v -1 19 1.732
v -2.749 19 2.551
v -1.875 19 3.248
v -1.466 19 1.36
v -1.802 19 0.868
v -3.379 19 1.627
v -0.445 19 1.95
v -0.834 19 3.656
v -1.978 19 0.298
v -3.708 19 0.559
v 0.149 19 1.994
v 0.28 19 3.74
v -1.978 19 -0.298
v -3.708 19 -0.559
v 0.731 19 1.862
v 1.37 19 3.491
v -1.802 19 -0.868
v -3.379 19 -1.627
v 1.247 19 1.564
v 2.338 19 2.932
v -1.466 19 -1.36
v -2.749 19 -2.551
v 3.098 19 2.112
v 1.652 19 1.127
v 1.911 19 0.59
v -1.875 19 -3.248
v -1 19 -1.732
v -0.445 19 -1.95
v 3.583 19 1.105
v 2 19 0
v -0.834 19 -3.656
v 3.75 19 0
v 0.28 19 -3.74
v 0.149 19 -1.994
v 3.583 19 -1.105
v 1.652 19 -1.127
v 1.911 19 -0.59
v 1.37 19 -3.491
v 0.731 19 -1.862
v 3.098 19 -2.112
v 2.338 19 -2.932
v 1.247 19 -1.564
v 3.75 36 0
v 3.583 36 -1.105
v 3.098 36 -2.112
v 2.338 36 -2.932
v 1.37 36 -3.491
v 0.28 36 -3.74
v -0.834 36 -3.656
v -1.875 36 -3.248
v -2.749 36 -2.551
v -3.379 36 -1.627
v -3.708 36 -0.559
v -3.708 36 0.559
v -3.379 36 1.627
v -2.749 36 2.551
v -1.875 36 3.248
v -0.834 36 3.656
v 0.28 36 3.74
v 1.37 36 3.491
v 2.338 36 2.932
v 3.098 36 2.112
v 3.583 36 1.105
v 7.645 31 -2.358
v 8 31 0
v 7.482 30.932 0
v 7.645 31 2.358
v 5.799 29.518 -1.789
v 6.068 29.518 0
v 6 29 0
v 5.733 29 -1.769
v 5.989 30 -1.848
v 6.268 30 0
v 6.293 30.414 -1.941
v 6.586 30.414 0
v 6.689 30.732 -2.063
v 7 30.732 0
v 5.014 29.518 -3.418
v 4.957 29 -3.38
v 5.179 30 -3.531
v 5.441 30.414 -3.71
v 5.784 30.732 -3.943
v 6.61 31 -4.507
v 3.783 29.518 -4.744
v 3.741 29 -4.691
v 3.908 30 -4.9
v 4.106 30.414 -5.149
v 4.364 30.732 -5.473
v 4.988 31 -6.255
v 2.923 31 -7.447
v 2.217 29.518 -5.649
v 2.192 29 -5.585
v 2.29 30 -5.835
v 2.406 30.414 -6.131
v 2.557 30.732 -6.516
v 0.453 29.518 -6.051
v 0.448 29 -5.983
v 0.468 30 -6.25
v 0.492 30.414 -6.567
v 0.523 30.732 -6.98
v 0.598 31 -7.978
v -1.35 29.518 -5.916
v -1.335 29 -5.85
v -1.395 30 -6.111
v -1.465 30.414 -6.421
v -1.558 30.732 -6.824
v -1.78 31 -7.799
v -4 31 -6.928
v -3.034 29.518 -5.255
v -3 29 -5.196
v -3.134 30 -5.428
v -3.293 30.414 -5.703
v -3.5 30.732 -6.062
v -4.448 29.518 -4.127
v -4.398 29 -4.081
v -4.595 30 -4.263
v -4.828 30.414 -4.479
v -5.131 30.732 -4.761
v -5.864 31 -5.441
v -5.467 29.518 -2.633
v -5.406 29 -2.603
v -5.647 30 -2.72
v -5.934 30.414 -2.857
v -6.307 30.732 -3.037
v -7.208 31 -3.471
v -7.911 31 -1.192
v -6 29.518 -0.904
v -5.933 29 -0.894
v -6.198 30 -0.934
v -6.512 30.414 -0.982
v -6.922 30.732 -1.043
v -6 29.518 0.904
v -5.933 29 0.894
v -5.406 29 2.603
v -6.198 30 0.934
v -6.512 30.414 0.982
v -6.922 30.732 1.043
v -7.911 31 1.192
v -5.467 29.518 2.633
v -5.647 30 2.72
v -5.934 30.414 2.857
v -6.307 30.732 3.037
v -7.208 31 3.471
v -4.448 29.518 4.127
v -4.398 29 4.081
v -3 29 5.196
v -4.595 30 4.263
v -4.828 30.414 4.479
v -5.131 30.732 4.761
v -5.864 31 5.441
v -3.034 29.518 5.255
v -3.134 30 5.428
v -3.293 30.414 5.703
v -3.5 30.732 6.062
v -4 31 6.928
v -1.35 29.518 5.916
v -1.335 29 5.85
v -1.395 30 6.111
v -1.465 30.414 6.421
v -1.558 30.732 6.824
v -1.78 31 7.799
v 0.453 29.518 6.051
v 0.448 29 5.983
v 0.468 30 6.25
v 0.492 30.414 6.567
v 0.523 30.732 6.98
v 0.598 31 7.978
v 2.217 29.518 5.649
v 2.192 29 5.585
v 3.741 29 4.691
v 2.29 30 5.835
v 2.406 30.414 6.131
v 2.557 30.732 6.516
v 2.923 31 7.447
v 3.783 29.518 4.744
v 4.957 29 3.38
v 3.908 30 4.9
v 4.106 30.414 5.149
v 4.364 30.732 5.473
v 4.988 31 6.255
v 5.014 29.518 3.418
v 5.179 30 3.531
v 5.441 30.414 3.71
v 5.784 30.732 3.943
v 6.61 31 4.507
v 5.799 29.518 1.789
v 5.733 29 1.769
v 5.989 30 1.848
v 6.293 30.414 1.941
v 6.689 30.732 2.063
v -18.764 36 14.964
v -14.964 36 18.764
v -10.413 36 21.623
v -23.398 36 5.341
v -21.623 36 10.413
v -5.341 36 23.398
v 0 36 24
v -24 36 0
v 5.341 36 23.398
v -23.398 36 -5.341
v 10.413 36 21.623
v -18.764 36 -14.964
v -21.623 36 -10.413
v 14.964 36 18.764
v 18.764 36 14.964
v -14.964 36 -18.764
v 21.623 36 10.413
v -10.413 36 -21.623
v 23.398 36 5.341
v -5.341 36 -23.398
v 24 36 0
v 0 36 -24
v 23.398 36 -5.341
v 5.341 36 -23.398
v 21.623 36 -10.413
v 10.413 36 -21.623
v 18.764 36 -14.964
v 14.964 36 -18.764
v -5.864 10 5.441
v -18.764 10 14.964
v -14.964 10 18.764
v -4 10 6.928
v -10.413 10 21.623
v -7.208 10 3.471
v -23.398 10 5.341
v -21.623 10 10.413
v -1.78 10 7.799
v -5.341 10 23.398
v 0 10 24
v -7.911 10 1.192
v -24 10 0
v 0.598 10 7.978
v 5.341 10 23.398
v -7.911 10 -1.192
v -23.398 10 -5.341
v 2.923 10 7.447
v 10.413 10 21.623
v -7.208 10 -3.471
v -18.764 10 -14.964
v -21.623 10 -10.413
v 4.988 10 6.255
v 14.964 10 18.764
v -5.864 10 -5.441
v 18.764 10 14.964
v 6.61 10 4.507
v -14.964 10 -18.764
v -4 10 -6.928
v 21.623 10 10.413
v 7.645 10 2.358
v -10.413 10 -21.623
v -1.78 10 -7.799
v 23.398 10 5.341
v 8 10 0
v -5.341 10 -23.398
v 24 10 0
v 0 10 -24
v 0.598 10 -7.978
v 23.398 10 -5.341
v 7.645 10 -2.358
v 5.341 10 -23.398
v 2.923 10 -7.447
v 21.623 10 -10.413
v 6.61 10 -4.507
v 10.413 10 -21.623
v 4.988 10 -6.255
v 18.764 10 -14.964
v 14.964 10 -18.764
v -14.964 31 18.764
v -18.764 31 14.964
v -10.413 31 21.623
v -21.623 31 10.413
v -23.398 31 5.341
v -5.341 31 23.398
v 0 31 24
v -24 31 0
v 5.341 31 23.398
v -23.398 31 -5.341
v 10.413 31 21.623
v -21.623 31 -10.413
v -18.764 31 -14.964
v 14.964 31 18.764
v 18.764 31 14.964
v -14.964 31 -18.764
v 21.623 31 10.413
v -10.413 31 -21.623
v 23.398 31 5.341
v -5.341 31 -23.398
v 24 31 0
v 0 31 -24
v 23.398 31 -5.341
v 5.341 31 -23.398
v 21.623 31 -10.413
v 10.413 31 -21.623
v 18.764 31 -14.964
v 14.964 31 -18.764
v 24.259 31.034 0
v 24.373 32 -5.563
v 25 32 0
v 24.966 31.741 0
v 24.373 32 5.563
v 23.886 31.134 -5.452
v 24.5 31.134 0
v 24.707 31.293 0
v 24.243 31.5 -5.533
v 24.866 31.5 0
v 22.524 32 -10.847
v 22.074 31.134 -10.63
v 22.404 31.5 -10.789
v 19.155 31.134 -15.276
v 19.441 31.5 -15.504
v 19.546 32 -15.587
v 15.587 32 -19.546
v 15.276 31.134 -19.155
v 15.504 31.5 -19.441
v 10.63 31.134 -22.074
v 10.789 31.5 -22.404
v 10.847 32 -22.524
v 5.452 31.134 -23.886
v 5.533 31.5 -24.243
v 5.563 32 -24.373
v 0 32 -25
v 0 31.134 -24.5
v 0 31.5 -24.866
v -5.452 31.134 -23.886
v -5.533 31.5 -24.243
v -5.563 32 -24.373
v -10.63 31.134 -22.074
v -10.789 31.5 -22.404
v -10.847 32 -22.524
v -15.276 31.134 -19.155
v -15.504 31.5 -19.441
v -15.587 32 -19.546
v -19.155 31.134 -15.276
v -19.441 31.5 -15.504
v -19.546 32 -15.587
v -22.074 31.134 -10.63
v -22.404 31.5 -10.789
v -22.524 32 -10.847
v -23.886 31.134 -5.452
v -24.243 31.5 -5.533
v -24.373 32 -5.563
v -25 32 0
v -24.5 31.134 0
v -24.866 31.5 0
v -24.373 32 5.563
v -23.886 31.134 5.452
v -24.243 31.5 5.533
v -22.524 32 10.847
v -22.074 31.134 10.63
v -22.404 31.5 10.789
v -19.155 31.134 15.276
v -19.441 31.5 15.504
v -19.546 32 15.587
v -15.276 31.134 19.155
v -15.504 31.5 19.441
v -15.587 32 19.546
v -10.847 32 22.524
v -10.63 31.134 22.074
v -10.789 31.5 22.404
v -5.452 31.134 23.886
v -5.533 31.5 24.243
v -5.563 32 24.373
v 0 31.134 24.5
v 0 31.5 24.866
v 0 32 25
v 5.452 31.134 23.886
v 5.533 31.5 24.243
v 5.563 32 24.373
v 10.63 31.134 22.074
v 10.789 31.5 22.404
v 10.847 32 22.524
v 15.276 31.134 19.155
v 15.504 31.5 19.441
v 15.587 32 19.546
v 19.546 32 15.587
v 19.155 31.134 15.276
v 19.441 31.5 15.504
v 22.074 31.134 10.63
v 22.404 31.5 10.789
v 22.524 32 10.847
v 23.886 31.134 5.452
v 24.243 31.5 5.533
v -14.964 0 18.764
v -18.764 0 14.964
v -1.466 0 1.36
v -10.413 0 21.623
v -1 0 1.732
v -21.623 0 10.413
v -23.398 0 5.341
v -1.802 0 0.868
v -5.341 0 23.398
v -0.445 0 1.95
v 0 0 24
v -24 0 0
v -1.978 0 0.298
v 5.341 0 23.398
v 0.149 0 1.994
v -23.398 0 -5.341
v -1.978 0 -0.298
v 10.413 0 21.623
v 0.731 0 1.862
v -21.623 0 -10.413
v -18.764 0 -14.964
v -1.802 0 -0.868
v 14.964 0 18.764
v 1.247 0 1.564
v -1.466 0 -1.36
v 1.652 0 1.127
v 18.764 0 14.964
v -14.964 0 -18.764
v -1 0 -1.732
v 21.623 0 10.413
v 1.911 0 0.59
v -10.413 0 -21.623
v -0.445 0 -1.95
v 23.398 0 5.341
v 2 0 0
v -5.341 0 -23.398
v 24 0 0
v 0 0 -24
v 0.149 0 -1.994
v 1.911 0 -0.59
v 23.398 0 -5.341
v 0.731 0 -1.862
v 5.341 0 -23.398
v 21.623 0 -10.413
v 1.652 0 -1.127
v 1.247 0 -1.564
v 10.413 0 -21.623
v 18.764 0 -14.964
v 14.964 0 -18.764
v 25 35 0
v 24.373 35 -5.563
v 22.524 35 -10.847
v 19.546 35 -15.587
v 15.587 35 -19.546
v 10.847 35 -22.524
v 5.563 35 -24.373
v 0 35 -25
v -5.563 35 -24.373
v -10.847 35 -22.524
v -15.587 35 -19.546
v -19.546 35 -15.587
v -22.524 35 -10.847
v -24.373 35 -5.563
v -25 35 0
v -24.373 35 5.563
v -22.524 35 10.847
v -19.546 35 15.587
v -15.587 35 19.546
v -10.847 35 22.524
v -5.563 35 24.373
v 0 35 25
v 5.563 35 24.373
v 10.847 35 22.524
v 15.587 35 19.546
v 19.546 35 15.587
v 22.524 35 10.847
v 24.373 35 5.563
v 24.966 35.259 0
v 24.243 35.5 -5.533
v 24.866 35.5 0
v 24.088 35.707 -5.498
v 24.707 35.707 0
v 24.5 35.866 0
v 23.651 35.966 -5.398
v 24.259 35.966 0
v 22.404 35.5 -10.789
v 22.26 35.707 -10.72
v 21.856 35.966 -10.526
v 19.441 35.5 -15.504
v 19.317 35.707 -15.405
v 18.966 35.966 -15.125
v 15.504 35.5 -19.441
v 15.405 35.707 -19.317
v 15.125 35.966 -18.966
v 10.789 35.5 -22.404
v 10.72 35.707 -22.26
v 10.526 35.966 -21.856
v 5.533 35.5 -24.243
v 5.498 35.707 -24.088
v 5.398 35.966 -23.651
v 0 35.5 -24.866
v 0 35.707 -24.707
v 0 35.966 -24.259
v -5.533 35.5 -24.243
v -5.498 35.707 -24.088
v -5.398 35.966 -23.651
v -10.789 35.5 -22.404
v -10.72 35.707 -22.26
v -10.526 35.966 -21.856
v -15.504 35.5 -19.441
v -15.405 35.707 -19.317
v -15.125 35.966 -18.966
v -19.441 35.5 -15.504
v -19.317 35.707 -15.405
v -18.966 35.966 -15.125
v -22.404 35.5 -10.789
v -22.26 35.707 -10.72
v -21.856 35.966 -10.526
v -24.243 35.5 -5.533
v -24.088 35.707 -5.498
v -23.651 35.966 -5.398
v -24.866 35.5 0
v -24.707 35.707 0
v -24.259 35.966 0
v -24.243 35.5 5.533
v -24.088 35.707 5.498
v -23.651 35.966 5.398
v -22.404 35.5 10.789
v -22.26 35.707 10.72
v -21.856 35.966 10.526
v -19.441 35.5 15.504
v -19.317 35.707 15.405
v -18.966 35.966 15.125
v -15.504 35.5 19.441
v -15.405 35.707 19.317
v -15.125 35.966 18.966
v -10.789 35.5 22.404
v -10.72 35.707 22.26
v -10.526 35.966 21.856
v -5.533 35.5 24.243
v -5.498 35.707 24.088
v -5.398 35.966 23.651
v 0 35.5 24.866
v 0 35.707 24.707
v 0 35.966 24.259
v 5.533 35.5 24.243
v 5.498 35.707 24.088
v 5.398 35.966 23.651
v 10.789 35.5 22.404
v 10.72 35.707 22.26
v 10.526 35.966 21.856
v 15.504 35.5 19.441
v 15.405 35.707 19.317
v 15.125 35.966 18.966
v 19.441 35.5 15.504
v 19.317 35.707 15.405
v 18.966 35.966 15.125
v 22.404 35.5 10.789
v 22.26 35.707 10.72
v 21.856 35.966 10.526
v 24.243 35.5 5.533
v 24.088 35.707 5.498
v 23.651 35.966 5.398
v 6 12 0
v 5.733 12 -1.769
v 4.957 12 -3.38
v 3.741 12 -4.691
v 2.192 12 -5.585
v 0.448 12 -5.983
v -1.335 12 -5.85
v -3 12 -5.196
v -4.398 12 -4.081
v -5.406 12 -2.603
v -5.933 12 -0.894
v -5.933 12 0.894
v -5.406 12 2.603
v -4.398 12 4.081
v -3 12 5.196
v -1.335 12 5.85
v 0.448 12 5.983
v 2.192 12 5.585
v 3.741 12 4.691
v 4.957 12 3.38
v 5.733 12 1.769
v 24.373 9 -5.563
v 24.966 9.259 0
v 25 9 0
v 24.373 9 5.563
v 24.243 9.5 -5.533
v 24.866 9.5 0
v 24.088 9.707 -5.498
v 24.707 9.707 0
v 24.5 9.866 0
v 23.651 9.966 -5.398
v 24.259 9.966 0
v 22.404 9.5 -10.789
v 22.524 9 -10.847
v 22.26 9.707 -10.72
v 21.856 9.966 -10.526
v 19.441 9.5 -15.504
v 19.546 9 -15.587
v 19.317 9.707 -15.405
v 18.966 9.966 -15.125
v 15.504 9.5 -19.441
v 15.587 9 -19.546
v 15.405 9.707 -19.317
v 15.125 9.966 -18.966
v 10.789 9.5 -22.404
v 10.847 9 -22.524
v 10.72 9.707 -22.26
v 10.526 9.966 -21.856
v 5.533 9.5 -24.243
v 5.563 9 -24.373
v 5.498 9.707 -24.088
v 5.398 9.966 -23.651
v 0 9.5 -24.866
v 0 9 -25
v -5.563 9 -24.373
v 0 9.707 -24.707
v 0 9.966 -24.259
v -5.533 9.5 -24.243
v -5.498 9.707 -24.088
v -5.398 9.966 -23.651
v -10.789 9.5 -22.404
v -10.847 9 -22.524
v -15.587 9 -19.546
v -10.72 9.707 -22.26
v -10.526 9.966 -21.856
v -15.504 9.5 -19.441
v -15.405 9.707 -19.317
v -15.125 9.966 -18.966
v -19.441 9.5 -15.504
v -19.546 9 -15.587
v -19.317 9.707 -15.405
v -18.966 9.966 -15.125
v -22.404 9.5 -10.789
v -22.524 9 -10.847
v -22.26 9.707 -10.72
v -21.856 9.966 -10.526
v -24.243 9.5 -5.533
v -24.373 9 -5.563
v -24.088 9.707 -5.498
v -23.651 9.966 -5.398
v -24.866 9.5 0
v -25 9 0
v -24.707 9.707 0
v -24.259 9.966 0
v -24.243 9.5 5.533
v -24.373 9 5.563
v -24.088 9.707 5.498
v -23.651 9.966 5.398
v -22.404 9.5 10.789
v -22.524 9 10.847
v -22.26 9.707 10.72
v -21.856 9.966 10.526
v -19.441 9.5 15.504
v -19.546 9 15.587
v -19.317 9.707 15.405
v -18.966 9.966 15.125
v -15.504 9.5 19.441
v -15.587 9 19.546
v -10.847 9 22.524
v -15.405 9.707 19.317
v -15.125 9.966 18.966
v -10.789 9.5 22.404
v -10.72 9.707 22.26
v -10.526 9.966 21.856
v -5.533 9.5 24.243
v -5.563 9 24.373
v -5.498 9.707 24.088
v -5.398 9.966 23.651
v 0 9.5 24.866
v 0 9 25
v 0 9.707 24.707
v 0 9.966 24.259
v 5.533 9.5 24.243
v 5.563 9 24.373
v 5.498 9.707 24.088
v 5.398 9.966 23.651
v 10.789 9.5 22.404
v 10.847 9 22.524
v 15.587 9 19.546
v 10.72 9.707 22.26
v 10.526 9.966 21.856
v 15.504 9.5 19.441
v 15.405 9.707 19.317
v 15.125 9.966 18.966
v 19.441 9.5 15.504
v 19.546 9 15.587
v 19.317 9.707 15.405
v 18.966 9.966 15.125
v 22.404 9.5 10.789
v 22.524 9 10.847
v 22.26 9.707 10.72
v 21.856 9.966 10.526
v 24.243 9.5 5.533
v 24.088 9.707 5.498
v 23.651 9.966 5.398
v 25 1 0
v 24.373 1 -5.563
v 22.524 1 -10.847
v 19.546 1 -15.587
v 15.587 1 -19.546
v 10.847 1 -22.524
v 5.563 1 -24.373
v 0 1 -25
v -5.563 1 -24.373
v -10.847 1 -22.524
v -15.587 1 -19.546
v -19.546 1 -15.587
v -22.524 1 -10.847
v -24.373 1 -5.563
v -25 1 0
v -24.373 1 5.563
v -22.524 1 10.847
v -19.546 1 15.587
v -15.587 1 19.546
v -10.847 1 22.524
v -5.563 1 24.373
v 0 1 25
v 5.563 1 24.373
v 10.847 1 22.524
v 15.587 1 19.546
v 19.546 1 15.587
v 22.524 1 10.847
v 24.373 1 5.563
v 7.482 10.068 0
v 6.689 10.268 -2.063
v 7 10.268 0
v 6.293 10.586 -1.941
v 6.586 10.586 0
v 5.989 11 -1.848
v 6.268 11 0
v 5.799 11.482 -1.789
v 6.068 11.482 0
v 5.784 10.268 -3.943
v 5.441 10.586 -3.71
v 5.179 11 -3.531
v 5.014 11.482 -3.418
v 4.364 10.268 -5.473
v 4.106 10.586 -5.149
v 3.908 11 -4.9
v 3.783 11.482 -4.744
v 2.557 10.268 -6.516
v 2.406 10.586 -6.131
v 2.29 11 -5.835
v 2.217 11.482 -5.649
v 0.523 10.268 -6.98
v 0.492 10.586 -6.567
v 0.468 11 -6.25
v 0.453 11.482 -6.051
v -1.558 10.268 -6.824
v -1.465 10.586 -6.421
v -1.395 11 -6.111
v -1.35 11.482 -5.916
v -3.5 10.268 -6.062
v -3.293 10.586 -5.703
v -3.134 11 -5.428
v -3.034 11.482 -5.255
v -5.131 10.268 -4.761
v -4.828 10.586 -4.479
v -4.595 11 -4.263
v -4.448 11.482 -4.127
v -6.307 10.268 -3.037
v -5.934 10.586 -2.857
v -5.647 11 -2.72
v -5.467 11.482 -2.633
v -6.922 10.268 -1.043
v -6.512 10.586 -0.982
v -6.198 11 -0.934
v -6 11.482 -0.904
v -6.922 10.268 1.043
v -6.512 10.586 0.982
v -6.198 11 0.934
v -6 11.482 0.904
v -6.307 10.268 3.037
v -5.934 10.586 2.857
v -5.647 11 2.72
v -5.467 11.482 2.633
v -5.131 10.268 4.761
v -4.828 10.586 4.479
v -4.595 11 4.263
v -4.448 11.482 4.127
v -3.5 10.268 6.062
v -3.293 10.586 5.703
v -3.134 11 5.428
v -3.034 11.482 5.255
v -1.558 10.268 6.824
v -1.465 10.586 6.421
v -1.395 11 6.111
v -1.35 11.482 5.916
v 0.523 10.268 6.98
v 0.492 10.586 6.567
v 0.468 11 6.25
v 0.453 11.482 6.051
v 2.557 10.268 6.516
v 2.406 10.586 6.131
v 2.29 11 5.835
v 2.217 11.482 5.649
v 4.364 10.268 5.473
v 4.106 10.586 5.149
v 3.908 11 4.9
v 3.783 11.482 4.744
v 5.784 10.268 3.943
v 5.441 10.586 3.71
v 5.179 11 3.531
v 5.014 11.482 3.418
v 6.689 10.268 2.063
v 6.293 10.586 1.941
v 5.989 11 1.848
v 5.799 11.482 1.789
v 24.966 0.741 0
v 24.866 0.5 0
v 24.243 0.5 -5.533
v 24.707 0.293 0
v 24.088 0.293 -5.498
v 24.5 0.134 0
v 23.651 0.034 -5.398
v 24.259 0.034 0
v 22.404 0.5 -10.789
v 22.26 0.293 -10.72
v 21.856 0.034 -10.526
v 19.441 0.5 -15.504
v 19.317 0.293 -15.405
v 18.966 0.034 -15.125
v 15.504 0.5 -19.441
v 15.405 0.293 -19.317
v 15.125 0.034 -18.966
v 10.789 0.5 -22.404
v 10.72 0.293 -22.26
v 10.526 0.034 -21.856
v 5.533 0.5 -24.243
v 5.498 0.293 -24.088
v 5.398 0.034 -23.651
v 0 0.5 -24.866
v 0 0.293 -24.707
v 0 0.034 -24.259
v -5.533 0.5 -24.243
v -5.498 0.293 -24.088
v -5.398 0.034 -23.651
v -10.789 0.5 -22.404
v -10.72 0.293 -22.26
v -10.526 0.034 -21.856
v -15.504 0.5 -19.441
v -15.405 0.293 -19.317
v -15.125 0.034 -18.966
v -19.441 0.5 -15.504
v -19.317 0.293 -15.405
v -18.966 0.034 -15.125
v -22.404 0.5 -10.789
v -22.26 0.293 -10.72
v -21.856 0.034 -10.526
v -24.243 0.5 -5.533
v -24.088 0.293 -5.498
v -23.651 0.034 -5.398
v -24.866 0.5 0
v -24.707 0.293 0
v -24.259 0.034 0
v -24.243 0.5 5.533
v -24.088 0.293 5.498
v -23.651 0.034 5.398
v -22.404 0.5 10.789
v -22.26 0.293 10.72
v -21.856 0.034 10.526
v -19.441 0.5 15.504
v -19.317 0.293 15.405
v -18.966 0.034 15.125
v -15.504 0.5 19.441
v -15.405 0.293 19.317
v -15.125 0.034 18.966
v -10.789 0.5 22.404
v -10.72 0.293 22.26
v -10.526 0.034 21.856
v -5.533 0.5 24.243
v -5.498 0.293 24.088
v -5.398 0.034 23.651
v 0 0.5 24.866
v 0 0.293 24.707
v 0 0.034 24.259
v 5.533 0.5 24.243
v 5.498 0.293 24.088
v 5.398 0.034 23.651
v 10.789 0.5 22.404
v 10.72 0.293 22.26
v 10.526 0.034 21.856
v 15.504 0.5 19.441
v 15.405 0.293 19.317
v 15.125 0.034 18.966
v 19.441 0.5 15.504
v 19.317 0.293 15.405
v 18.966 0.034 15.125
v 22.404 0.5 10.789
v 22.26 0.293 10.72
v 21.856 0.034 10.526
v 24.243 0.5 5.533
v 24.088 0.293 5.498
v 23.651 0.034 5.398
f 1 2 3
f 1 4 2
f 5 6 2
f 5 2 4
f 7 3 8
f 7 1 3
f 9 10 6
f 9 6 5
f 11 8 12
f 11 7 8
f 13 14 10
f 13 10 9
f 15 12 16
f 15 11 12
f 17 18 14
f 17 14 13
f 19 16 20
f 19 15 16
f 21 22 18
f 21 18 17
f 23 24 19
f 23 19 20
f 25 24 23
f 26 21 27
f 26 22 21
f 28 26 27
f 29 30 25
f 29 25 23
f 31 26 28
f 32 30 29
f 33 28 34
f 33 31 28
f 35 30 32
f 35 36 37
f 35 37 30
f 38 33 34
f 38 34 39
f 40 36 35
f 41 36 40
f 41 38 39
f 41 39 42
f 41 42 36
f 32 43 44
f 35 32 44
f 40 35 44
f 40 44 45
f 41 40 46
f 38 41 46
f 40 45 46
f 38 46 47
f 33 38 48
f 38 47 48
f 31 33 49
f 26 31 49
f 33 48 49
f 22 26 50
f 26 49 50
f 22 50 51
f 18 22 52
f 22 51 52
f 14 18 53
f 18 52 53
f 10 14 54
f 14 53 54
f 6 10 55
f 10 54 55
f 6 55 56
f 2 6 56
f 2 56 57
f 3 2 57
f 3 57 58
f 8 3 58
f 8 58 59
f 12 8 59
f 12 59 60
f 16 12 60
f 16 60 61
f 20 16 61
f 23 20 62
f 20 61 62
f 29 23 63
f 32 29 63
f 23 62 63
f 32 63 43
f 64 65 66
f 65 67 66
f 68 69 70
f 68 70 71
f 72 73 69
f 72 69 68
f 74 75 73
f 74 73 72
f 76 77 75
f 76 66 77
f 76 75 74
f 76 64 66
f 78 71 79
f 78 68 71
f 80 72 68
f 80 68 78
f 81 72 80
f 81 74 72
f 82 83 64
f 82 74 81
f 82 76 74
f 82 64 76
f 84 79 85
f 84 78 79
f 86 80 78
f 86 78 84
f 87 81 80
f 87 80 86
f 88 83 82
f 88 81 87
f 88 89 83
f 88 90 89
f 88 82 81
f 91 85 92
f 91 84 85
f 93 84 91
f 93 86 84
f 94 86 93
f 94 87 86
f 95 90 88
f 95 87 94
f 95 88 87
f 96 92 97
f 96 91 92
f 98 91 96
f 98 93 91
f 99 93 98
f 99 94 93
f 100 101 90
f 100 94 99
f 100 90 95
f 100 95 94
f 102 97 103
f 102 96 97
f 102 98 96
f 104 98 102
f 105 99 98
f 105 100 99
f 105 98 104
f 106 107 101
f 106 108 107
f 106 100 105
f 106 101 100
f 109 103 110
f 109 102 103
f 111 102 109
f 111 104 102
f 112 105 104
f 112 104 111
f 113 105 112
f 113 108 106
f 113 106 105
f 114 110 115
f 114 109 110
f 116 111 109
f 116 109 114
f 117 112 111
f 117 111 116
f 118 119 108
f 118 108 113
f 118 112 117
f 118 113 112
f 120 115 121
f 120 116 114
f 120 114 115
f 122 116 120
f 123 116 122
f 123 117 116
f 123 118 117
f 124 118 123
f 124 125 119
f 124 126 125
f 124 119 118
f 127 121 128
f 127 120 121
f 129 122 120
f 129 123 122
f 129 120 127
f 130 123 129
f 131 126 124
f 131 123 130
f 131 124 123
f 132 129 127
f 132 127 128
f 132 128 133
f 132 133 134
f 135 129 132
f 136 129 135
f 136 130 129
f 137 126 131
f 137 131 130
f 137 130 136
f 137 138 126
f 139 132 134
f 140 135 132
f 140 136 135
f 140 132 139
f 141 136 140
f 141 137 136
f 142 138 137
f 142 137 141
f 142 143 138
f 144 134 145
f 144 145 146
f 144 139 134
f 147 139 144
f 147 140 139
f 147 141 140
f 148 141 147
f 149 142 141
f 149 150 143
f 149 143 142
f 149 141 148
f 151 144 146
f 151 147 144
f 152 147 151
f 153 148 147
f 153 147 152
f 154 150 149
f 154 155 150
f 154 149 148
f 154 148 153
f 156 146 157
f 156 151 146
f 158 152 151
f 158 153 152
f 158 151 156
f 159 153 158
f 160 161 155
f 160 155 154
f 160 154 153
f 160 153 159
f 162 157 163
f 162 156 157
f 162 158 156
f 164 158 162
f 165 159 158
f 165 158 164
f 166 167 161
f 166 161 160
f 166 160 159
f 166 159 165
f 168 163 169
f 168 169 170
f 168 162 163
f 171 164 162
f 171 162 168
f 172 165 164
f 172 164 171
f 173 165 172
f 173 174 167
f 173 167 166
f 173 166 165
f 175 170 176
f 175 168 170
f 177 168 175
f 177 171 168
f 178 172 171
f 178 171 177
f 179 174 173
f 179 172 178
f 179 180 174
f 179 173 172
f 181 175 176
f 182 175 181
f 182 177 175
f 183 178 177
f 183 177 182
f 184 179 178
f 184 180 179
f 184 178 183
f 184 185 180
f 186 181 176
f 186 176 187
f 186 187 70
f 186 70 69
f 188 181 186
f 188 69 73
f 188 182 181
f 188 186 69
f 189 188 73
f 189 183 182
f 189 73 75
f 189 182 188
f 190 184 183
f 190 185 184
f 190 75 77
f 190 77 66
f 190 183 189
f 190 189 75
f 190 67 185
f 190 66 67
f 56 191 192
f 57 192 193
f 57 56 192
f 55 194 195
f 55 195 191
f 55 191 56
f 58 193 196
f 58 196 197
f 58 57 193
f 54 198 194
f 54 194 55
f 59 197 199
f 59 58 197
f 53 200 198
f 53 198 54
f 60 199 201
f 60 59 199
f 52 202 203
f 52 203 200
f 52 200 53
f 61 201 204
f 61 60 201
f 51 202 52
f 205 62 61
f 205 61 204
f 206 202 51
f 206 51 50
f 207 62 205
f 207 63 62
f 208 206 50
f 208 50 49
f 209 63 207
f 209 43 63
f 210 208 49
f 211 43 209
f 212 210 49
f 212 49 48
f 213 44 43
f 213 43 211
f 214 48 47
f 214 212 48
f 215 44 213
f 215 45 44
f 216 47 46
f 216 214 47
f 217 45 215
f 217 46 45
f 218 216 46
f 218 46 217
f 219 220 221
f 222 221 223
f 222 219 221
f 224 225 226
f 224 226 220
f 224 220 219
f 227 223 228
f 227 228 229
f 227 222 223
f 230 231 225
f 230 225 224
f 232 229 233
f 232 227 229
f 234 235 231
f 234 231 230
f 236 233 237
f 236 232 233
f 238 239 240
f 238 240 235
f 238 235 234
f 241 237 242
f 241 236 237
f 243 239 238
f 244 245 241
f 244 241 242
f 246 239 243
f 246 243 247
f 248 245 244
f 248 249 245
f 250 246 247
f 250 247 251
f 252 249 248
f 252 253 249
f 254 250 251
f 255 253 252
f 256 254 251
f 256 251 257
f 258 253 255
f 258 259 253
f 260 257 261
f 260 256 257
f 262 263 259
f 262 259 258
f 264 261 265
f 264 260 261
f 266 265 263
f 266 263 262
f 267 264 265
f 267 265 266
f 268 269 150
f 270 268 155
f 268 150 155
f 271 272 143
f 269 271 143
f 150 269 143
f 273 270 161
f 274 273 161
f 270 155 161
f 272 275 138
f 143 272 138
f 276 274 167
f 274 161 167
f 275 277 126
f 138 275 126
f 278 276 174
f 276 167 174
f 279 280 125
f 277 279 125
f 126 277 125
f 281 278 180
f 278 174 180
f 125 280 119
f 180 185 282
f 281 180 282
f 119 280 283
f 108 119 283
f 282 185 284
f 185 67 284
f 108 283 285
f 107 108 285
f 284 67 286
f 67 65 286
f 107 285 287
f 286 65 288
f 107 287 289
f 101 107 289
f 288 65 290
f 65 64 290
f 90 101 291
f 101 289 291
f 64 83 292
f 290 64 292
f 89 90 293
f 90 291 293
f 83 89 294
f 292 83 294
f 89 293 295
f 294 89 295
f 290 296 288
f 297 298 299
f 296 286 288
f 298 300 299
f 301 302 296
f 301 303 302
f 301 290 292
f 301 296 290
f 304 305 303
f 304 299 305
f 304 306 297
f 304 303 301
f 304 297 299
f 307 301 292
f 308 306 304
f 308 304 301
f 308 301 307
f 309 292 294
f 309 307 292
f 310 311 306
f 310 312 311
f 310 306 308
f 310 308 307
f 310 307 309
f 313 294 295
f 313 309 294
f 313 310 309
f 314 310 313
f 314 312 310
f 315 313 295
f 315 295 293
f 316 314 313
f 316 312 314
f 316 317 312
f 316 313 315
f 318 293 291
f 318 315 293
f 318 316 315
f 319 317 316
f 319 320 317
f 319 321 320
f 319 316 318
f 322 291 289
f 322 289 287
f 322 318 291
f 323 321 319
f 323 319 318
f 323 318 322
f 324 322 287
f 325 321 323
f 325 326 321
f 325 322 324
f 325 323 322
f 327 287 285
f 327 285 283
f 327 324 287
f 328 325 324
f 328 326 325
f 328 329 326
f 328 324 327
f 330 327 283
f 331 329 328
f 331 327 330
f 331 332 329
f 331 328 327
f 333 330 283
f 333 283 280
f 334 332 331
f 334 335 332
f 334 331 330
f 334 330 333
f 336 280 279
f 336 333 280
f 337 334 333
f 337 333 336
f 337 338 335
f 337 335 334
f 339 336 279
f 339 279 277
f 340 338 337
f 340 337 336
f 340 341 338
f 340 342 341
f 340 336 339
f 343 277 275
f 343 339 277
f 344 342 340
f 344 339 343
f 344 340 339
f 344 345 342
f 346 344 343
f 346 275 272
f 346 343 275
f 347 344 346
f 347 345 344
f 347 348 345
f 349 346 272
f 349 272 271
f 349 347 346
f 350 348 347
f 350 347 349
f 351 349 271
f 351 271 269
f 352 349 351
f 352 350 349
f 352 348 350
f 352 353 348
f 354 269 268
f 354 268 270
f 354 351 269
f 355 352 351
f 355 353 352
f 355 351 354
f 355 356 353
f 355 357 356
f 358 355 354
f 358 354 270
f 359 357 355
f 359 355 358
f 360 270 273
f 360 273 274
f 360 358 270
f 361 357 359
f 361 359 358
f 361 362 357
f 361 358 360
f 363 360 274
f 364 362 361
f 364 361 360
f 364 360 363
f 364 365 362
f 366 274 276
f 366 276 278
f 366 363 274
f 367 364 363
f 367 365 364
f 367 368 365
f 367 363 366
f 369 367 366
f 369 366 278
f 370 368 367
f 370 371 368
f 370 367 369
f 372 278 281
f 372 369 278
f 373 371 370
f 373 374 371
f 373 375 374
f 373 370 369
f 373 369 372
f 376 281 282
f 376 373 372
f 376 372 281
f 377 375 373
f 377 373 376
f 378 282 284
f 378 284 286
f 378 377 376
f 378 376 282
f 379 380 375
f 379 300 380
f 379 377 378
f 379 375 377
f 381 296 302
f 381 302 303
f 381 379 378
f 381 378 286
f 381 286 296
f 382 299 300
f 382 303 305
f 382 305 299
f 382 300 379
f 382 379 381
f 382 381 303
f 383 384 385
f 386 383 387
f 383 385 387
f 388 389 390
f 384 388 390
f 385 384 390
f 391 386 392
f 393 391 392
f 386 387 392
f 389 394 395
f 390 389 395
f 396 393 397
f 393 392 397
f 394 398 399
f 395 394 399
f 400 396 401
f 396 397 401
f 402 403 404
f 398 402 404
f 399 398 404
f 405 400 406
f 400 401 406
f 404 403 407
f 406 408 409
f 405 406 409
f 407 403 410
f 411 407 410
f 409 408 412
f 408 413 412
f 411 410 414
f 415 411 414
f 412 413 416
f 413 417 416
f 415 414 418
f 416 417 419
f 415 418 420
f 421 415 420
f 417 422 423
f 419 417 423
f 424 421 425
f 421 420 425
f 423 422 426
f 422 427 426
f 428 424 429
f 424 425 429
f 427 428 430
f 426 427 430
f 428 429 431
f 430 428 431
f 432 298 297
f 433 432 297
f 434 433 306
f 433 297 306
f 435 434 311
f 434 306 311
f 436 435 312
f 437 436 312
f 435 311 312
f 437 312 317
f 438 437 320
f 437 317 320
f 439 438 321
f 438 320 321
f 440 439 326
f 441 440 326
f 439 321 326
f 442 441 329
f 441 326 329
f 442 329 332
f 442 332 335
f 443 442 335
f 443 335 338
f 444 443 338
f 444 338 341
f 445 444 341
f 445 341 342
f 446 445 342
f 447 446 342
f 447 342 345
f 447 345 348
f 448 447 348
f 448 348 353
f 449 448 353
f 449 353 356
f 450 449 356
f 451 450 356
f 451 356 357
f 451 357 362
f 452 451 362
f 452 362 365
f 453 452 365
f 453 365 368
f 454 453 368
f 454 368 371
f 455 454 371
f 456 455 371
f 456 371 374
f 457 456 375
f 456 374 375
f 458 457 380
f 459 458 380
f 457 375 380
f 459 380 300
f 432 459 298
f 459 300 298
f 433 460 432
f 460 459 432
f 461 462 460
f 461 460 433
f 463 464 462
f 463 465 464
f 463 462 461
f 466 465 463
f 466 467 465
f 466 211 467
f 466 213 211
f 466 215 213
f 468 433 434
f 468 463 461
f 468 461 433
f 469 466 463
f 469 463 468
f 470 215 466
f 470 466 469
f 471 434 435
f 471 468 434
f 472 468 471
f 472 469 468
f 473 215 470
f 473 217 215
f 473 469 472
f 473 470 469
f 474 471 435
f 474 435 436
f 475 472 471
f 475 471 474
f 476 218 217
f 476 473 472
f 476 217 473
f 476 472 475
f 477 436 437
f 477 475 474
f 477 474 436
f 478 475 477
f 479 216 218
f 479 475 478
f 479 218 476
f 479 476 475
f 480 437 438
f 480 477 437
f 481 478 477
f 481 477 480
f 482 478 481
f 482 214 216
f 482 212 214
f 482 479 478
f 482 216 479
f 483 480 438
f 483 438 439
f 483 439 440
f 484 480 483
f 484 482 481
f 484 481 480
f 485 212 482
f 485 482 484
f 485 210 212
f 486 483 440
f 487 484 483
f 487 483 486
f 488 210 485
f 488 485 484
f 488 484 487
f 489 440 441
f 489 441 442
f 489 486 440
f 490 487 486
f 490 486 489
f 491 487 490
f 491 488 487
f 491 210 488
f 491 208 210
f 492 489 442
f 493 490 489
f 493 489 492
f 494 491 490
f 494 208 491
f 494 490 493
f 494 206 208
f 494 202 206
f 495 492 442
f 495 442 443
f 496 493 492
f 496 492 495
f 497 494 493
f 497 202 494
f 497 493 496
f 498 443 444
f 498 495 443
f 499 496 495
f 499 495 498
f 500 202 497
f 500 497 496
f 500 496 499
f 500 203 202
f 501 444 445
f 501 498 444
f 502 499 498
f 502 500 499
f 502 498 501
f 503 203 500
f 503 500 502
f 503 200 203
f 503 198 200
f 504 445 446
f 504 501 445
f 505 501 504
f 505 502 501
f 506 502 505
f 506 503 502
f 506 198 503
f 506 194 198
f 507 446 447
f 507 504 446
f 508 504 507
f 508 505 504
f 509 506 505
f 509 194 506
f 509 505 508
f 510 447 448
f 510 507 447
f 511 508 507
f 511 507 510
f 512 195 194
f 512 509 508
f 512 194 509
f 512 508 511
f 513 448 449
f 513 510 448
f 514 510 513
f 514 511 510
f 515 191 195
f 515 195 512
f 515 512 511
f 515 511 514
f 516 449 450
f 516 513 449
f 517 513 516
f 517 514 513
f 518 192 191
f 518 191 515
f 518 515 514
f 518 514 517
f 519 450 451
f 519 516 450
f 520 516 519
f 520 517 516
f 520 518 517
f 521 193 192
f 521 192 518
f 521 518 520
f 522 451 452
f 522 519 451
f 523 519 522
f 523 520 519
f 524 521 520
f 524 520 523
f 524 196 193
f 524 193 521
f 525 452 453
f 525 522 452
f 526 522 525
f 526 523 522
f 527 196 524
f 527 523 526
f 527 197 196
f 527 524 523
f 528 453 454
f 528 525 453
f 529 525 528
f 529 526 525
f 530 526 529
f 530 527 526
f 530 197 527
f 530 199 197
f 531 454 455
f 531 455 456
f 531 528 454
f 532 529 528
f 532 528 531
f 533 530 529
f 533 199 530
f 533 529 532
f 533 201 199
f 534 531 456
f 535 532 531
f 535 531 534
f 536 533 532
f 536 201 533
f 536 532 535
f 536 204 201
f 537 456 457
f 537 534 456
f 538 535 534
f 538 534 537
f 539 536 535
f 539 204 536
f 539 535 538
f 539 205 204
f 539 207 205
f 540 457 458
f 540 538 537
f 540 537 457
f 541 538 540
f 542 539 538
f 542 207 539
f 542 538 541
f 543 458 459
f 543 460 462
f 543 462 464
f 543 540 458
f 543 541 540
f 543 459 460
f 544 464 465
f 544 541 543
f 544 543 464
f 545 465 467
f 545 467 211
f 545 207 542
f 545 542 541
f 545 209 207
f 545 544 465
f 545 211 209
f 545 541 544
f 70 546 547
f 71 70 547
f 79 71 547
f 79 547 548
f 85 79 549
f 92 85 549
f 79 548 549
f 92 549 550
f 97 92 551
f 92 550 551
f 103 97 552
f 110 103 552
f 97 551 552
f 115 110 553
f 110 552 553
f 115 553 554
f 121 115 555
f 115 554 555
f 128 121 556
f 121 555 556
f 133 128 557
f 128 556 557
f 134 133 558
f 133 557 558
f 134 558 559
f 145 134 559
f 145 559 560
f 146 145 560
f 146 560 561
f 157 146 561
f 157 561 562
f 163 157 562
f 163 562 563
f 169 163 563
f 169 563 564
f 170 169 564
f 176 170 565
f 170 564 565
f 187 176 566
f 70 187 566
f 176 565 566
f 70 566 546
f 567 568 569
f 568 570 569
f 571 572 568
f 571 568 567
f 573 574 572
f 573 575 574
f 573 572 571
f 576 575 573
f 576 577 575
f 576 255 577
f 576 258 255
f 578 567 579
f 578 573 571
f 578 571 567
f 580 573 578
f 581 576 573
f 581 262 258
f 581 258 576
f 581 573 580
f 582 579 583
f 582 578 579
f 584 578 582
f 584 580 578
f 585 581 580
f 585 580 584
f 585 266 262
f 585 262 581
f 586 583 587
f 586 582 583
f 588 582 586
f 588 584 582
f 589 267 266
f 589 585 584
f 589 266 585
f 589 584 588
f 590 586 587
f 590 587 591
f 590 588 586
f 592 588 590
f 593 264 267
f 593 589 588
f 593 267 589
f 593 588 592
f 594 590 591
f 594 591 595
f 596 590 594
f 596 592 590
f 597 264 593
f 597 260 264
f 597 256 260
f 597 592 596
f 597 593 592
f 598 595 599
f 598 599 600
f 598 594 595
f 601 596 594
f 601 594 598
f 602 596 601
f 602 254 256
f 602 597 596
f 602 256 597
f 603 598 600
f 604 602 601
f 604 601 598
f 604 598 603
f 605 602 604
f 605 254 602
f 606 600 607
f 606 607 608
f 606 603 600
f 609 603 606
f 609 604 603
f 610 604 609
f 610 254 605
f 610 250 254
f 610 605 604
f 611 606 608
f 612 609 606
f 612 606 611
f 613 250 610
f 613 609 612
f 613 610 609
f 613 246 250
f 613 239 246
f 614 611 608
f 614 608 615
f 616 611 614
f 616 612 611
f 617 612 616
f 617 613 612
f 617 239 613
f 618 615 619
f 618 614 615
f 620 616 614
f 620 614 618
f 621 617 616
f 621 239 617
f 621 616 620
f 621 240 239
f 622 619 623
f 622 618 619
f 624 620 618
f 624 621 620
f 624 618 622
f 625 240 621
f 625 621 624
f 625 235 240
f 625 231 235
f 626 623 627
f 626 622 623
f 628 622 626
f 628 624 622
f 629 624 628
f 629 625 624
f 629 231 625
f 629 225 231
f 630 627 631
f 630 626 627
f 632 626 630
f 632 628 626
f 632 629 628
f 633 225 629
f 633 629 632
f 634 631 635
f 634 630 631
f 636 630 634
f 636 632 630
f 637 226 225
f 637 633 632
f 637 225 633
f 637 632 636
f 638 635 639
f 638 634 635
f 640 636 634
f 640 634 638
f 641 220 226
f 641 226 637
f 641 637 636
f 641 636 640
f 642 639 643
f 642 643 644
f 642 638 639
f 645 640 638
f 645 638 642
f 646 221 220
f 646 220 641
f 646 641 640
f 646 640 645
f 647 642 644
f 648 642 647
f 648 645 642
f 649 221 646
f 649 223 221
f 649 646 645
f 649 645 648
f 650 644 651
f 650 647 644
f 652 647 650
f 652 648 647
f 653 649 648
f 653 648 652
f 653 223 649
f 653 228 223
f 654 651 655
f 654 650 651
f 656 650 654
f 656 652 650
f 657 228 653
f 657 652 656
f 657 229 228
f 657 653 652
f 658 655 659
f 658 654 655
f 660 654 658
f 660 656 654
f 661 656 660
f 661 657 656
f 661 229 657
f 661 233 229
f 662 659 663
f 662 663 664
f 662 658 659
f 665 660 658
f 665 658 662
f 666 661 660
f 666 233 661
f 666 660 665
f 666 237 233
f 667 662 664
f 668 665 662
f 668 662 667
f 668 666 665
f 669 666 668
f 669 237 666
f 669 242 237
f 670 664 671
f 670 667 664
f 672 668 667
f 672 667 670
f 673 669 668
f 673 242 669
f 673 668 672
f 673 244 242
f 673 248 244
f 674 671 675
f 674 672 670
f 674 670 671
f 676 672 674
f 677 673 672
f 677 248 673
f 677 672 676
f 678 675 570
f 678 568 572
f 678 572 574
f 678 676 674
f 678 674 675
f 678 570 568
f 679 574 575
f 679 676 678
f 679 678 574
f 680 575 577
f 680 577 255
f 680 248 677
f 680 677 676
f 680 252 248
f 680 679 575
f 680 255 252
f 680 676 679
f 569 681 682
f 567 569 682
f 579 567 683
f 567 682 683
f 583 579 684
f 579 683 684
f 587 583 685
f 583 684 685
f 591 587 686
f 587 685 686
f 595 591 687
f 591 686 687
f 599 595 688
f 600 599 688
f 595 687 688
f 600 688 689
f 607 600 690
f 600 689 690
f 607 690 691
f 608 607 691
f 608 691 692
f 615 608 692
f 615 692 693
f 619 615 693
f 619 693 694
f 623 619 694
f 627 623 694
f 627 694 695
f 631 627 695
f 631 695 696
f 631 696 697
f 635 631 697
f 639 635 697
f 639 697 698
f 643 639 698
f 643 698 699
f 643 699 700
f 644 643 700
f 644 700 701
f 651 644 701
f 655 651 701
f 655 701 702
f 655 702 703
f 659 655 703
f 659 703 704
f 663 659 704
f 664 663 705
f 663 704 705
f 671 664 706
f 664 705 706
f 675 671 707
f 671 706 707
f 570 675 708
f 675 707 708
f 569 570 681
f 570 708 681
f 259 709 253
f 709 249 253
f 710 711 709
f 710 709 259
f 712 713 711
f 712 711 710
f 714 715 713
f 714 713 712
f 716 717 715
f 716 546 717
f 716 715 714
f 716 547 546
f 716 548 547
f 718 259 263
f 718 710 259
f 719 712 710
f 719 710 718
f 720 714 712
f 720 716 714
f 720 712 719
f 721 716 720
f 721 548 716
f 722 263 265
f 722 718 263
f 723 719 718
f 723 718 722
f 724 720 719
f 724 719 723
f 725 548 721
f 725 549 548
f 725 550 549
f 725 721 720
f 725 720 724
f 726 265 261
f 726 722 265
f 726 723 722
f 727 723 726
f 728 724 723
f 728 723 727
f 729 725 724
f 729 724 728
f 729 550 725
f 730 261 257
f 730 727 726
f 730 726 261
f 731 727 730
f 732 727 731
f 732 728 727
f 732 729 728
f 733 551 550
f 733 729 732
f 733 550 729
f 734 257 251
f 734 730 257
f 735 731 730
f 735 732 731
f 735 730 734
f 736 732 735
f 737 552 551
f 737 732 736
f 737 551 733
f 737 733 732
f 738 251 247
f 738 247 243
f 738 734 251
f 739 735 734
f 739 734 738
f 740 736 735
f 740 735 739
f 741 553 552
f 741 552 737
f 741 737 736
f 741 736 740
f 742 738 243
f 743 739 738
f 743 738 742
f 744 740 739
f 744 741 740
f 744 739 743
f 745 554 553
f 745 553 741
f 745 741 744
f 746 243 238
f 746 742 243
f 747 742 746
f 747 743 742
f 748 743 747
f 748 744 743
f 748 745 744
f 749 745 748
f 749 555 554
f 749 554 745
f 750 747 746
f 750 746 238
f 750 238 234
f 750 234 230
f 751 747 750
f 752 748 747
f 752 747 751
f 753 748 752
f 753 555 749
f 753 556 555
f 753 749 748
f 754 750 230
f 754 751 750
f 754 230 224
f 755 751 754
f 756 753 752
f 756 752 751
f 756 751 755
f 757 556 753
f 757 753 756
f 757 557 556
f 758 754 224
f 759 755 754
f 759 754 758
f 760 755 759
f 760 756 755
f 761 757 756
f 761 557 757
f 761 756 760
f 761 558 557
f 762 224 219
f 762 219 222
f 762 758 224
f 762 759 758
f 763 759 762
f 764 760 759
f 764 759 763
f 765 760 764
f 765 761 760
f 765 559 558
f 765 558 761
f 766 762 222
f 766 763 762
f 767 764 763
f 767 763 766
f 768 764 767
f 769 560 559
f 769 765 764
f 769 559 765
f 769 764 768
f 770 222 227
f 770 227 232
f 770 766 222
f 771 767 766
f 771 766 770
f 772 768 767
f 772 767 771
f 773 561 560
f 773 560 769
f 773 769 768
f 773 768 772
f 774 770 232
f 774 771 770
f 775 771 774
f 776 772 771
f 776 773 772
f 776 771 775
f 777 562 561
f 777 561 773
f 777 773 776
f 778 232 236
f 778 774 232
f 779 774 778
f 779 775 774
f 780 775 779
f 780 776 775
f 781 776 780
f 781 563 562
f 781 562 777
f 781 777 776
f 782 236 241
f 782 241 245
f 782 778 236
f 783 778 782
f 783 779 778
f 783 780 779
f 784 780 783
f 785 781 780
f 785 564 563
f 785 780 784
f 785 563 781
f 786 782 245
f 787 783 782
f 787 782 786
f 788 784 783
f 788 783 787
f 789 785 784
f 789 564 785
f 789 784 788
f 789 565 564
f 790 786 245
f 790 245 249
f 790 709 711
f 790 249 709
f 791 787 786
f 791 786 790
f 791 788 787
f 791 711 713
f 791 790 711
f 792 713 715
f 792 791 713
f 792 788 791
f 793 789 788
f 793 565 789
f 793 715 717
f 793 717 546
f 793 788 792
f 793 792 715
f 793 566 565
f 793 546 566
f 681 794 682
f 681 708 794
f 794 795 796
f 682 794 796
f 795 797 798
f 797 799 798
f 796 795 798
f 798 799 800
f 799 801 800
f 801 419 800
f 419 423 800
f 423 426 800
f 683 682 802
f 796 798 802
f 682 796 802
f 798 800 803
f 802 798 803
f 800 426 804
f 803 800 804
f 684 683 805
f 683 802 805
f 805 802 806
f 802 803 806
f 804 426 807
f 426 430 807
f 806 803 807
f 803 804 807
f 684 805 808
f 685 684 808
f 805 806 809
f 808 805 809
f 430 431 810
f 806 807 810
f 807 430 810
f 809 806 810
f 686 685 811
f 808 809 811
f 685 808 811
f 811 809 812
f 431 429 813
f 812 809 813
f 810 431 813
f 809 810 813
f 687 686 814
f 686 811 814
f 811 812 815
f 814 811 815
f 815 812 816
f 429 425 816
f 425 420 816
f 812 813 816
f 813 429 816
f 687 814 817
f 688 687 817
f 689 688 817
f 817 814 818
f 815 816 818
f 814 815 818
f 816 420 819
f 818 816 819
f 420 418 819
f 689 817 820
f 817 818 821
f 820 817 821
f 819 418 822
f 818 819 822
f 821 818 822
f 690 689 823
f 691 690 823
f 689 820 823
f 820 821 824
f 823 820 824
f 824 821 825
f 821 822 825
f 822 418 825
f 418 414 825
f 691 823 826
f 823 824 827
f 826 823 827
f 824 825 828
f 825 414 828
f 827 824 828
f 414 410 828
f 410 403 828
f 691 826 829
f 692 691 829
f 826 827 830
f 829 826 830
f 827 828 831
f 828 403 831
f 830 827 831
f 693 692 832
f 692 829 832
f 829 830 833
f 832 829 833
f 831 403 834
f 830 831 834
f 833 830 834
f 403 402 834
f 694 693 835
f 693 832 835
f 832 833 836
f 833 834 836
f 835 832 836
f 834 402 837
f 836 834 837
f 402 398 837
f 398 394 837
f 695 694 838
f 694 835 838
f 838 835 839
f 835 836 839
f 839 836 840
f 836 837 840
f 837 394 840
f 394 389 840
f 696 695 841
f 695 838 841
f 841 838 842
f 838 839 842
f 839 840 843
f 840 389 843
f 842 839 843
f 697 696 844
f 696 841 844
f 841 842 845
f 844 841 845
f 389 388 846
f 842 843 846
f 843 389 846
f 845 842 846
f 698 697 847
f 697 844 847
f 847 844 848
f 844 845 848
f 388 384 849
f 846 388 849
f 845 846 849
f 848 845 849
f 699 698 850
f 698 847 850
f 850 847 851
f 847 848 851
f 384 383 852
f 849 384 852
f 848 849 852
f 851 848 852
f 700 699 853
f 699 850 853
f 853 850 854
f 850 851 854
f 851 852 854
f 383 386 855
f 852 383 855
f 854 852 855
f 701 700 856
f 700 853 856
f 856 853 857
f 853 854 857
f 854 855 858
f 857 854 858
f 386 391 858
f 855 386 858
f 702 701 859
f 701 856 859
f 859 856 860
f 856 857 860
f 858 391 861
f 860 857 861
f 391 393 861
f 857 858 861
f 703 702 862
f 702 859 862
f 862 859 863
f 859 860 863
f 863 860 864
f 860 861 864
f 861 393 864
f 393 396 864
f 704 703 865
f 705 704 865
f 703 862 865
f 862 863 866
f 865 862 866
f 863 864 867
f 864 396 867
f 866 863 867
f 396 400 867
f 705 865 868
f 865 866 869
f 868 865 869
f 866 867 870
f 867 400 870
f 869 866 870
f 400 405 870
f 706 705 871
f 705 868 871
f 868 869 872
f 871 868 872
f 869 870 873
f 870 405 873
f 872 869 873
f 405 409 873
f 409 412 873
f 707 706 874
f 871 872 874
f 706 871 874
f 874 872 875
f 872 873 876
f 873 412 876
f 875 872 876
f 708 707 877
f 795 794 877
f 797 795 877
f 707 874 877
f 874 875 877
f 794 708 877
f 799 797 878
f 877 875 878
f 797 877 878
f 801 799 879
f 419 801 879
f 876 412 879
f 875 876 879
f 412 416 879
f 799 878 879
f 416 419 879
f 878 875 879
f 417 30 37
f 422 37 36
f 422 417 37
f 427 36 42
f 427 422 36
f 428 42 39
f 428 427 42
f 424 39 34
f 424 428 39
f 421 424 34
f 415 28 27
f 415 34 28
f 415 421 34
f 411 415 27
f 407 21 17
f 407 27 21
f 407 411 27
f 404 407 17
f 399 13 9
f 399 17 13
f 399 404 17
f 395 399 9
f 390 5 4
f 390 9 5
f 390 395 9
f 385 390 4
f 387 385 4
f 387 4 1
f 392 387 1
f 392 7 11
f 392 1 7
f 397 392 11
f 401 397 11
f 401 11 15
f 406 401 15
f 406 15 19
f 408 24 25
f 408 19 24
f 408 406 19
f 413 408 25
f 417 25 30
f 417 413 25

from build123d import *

# Parameters (mm, degrees)
SKETCH_1_R               = 25
EXTRUDE_1_DEPTH          = 36
CUT_EXTRUDE_START        = 10
SKETCH_2_R               = 25
SKETCH_2_R_2             = 6
CUT_EXTRUDE_1_DEPTH      = 21
SKETCH_4_R               = 2
CUT_EXTRUDE_3_DEPTH      = 47
CUT_EXTRUDE_3_DEPTH_BACK = 47
SKETCH_3_R               = 3.75
CUT_EXTRUDE_7_DEPTH      = 17
FILLET_1_R               = 1
FILLET_2_R               = 2


with BuildPart() as part:
    # 草图1 → 凸台-拉伸1 (new body)
    with BuildSketch(Plane(origin=(0, 0, 0), x_dir=(1, 0, 0), z_dir=(0, 1, 0))):
        Circle(SKETCH_1_R)
    extrude(amount=EXTRUDE_1_DEPTH)

    # 草图2 → 切除-拉伸1 (cut)
    with BuildSketch(Plane(origin=(0, 0, 0), x_dir=(1, 0, 0), z_dir=(0, 1, 0)).offset(CUT_EXTRUDE_START)):
        Circle(SKETCH_2_R)
        Circle(SKETCH_2_R_2, mode=Mode.SUBTRACT)
    extrude(amount=CUT_EXTRUDE_1_DEPTH, mode=Mode.SUBTRACT)

    # 草图4 → 切除-拉伸3 (cut, two sides)
    with BuildSketch(Plane(origin=(0, 0, 0), x_dir=(1, 0, 0), z_dir=(0, 1, 0))) as cut_extrude_3_sk:
        Circle(SKETCH_4_R)
    extrude(amount=CUT_EXTRUDE_3_DEPTH, mode=Mode.SUBTRACT)
    extrude(cut_extrude_3_sk.sketch, amount=-CUT_EXTRUDE_3_DEPTH_BACK, mode=Mode.SUBTRACT)

    # 草图3 → 切除-拉伸7 (cut)
    with BuildSketch(Plane(origin=(0, 36, 0), x_dir=(1, 0, 0), z_dir=(0, 1, 0))):
        Circle(SKETCH_3_R)
    extrude(amount=-CUT_EXTRUDE_7_DEPTH, mode=Mode.SUBTRACT)

    # 圆角1
    fillet_1_edges = [part.edges().sort_by_distance(p)[0] for p in [
        (-25, 0, 0),
        (-25, 36, 0),
        (-25, 10, 0),
        (-25, 31, 0),
    ]]
    fillet(fillet_1_edges, radius=FILLET_1_R)

    # 圆角2
    fillet_2_edges = [part.edges().sort_by_distance(p)[0] for p in [
        (-6, 31, 0),
        (-6, 10, 0),
    ]]
    fillet(fillet_2_edges, radius=FILLET_2_R)


solid = part.part
